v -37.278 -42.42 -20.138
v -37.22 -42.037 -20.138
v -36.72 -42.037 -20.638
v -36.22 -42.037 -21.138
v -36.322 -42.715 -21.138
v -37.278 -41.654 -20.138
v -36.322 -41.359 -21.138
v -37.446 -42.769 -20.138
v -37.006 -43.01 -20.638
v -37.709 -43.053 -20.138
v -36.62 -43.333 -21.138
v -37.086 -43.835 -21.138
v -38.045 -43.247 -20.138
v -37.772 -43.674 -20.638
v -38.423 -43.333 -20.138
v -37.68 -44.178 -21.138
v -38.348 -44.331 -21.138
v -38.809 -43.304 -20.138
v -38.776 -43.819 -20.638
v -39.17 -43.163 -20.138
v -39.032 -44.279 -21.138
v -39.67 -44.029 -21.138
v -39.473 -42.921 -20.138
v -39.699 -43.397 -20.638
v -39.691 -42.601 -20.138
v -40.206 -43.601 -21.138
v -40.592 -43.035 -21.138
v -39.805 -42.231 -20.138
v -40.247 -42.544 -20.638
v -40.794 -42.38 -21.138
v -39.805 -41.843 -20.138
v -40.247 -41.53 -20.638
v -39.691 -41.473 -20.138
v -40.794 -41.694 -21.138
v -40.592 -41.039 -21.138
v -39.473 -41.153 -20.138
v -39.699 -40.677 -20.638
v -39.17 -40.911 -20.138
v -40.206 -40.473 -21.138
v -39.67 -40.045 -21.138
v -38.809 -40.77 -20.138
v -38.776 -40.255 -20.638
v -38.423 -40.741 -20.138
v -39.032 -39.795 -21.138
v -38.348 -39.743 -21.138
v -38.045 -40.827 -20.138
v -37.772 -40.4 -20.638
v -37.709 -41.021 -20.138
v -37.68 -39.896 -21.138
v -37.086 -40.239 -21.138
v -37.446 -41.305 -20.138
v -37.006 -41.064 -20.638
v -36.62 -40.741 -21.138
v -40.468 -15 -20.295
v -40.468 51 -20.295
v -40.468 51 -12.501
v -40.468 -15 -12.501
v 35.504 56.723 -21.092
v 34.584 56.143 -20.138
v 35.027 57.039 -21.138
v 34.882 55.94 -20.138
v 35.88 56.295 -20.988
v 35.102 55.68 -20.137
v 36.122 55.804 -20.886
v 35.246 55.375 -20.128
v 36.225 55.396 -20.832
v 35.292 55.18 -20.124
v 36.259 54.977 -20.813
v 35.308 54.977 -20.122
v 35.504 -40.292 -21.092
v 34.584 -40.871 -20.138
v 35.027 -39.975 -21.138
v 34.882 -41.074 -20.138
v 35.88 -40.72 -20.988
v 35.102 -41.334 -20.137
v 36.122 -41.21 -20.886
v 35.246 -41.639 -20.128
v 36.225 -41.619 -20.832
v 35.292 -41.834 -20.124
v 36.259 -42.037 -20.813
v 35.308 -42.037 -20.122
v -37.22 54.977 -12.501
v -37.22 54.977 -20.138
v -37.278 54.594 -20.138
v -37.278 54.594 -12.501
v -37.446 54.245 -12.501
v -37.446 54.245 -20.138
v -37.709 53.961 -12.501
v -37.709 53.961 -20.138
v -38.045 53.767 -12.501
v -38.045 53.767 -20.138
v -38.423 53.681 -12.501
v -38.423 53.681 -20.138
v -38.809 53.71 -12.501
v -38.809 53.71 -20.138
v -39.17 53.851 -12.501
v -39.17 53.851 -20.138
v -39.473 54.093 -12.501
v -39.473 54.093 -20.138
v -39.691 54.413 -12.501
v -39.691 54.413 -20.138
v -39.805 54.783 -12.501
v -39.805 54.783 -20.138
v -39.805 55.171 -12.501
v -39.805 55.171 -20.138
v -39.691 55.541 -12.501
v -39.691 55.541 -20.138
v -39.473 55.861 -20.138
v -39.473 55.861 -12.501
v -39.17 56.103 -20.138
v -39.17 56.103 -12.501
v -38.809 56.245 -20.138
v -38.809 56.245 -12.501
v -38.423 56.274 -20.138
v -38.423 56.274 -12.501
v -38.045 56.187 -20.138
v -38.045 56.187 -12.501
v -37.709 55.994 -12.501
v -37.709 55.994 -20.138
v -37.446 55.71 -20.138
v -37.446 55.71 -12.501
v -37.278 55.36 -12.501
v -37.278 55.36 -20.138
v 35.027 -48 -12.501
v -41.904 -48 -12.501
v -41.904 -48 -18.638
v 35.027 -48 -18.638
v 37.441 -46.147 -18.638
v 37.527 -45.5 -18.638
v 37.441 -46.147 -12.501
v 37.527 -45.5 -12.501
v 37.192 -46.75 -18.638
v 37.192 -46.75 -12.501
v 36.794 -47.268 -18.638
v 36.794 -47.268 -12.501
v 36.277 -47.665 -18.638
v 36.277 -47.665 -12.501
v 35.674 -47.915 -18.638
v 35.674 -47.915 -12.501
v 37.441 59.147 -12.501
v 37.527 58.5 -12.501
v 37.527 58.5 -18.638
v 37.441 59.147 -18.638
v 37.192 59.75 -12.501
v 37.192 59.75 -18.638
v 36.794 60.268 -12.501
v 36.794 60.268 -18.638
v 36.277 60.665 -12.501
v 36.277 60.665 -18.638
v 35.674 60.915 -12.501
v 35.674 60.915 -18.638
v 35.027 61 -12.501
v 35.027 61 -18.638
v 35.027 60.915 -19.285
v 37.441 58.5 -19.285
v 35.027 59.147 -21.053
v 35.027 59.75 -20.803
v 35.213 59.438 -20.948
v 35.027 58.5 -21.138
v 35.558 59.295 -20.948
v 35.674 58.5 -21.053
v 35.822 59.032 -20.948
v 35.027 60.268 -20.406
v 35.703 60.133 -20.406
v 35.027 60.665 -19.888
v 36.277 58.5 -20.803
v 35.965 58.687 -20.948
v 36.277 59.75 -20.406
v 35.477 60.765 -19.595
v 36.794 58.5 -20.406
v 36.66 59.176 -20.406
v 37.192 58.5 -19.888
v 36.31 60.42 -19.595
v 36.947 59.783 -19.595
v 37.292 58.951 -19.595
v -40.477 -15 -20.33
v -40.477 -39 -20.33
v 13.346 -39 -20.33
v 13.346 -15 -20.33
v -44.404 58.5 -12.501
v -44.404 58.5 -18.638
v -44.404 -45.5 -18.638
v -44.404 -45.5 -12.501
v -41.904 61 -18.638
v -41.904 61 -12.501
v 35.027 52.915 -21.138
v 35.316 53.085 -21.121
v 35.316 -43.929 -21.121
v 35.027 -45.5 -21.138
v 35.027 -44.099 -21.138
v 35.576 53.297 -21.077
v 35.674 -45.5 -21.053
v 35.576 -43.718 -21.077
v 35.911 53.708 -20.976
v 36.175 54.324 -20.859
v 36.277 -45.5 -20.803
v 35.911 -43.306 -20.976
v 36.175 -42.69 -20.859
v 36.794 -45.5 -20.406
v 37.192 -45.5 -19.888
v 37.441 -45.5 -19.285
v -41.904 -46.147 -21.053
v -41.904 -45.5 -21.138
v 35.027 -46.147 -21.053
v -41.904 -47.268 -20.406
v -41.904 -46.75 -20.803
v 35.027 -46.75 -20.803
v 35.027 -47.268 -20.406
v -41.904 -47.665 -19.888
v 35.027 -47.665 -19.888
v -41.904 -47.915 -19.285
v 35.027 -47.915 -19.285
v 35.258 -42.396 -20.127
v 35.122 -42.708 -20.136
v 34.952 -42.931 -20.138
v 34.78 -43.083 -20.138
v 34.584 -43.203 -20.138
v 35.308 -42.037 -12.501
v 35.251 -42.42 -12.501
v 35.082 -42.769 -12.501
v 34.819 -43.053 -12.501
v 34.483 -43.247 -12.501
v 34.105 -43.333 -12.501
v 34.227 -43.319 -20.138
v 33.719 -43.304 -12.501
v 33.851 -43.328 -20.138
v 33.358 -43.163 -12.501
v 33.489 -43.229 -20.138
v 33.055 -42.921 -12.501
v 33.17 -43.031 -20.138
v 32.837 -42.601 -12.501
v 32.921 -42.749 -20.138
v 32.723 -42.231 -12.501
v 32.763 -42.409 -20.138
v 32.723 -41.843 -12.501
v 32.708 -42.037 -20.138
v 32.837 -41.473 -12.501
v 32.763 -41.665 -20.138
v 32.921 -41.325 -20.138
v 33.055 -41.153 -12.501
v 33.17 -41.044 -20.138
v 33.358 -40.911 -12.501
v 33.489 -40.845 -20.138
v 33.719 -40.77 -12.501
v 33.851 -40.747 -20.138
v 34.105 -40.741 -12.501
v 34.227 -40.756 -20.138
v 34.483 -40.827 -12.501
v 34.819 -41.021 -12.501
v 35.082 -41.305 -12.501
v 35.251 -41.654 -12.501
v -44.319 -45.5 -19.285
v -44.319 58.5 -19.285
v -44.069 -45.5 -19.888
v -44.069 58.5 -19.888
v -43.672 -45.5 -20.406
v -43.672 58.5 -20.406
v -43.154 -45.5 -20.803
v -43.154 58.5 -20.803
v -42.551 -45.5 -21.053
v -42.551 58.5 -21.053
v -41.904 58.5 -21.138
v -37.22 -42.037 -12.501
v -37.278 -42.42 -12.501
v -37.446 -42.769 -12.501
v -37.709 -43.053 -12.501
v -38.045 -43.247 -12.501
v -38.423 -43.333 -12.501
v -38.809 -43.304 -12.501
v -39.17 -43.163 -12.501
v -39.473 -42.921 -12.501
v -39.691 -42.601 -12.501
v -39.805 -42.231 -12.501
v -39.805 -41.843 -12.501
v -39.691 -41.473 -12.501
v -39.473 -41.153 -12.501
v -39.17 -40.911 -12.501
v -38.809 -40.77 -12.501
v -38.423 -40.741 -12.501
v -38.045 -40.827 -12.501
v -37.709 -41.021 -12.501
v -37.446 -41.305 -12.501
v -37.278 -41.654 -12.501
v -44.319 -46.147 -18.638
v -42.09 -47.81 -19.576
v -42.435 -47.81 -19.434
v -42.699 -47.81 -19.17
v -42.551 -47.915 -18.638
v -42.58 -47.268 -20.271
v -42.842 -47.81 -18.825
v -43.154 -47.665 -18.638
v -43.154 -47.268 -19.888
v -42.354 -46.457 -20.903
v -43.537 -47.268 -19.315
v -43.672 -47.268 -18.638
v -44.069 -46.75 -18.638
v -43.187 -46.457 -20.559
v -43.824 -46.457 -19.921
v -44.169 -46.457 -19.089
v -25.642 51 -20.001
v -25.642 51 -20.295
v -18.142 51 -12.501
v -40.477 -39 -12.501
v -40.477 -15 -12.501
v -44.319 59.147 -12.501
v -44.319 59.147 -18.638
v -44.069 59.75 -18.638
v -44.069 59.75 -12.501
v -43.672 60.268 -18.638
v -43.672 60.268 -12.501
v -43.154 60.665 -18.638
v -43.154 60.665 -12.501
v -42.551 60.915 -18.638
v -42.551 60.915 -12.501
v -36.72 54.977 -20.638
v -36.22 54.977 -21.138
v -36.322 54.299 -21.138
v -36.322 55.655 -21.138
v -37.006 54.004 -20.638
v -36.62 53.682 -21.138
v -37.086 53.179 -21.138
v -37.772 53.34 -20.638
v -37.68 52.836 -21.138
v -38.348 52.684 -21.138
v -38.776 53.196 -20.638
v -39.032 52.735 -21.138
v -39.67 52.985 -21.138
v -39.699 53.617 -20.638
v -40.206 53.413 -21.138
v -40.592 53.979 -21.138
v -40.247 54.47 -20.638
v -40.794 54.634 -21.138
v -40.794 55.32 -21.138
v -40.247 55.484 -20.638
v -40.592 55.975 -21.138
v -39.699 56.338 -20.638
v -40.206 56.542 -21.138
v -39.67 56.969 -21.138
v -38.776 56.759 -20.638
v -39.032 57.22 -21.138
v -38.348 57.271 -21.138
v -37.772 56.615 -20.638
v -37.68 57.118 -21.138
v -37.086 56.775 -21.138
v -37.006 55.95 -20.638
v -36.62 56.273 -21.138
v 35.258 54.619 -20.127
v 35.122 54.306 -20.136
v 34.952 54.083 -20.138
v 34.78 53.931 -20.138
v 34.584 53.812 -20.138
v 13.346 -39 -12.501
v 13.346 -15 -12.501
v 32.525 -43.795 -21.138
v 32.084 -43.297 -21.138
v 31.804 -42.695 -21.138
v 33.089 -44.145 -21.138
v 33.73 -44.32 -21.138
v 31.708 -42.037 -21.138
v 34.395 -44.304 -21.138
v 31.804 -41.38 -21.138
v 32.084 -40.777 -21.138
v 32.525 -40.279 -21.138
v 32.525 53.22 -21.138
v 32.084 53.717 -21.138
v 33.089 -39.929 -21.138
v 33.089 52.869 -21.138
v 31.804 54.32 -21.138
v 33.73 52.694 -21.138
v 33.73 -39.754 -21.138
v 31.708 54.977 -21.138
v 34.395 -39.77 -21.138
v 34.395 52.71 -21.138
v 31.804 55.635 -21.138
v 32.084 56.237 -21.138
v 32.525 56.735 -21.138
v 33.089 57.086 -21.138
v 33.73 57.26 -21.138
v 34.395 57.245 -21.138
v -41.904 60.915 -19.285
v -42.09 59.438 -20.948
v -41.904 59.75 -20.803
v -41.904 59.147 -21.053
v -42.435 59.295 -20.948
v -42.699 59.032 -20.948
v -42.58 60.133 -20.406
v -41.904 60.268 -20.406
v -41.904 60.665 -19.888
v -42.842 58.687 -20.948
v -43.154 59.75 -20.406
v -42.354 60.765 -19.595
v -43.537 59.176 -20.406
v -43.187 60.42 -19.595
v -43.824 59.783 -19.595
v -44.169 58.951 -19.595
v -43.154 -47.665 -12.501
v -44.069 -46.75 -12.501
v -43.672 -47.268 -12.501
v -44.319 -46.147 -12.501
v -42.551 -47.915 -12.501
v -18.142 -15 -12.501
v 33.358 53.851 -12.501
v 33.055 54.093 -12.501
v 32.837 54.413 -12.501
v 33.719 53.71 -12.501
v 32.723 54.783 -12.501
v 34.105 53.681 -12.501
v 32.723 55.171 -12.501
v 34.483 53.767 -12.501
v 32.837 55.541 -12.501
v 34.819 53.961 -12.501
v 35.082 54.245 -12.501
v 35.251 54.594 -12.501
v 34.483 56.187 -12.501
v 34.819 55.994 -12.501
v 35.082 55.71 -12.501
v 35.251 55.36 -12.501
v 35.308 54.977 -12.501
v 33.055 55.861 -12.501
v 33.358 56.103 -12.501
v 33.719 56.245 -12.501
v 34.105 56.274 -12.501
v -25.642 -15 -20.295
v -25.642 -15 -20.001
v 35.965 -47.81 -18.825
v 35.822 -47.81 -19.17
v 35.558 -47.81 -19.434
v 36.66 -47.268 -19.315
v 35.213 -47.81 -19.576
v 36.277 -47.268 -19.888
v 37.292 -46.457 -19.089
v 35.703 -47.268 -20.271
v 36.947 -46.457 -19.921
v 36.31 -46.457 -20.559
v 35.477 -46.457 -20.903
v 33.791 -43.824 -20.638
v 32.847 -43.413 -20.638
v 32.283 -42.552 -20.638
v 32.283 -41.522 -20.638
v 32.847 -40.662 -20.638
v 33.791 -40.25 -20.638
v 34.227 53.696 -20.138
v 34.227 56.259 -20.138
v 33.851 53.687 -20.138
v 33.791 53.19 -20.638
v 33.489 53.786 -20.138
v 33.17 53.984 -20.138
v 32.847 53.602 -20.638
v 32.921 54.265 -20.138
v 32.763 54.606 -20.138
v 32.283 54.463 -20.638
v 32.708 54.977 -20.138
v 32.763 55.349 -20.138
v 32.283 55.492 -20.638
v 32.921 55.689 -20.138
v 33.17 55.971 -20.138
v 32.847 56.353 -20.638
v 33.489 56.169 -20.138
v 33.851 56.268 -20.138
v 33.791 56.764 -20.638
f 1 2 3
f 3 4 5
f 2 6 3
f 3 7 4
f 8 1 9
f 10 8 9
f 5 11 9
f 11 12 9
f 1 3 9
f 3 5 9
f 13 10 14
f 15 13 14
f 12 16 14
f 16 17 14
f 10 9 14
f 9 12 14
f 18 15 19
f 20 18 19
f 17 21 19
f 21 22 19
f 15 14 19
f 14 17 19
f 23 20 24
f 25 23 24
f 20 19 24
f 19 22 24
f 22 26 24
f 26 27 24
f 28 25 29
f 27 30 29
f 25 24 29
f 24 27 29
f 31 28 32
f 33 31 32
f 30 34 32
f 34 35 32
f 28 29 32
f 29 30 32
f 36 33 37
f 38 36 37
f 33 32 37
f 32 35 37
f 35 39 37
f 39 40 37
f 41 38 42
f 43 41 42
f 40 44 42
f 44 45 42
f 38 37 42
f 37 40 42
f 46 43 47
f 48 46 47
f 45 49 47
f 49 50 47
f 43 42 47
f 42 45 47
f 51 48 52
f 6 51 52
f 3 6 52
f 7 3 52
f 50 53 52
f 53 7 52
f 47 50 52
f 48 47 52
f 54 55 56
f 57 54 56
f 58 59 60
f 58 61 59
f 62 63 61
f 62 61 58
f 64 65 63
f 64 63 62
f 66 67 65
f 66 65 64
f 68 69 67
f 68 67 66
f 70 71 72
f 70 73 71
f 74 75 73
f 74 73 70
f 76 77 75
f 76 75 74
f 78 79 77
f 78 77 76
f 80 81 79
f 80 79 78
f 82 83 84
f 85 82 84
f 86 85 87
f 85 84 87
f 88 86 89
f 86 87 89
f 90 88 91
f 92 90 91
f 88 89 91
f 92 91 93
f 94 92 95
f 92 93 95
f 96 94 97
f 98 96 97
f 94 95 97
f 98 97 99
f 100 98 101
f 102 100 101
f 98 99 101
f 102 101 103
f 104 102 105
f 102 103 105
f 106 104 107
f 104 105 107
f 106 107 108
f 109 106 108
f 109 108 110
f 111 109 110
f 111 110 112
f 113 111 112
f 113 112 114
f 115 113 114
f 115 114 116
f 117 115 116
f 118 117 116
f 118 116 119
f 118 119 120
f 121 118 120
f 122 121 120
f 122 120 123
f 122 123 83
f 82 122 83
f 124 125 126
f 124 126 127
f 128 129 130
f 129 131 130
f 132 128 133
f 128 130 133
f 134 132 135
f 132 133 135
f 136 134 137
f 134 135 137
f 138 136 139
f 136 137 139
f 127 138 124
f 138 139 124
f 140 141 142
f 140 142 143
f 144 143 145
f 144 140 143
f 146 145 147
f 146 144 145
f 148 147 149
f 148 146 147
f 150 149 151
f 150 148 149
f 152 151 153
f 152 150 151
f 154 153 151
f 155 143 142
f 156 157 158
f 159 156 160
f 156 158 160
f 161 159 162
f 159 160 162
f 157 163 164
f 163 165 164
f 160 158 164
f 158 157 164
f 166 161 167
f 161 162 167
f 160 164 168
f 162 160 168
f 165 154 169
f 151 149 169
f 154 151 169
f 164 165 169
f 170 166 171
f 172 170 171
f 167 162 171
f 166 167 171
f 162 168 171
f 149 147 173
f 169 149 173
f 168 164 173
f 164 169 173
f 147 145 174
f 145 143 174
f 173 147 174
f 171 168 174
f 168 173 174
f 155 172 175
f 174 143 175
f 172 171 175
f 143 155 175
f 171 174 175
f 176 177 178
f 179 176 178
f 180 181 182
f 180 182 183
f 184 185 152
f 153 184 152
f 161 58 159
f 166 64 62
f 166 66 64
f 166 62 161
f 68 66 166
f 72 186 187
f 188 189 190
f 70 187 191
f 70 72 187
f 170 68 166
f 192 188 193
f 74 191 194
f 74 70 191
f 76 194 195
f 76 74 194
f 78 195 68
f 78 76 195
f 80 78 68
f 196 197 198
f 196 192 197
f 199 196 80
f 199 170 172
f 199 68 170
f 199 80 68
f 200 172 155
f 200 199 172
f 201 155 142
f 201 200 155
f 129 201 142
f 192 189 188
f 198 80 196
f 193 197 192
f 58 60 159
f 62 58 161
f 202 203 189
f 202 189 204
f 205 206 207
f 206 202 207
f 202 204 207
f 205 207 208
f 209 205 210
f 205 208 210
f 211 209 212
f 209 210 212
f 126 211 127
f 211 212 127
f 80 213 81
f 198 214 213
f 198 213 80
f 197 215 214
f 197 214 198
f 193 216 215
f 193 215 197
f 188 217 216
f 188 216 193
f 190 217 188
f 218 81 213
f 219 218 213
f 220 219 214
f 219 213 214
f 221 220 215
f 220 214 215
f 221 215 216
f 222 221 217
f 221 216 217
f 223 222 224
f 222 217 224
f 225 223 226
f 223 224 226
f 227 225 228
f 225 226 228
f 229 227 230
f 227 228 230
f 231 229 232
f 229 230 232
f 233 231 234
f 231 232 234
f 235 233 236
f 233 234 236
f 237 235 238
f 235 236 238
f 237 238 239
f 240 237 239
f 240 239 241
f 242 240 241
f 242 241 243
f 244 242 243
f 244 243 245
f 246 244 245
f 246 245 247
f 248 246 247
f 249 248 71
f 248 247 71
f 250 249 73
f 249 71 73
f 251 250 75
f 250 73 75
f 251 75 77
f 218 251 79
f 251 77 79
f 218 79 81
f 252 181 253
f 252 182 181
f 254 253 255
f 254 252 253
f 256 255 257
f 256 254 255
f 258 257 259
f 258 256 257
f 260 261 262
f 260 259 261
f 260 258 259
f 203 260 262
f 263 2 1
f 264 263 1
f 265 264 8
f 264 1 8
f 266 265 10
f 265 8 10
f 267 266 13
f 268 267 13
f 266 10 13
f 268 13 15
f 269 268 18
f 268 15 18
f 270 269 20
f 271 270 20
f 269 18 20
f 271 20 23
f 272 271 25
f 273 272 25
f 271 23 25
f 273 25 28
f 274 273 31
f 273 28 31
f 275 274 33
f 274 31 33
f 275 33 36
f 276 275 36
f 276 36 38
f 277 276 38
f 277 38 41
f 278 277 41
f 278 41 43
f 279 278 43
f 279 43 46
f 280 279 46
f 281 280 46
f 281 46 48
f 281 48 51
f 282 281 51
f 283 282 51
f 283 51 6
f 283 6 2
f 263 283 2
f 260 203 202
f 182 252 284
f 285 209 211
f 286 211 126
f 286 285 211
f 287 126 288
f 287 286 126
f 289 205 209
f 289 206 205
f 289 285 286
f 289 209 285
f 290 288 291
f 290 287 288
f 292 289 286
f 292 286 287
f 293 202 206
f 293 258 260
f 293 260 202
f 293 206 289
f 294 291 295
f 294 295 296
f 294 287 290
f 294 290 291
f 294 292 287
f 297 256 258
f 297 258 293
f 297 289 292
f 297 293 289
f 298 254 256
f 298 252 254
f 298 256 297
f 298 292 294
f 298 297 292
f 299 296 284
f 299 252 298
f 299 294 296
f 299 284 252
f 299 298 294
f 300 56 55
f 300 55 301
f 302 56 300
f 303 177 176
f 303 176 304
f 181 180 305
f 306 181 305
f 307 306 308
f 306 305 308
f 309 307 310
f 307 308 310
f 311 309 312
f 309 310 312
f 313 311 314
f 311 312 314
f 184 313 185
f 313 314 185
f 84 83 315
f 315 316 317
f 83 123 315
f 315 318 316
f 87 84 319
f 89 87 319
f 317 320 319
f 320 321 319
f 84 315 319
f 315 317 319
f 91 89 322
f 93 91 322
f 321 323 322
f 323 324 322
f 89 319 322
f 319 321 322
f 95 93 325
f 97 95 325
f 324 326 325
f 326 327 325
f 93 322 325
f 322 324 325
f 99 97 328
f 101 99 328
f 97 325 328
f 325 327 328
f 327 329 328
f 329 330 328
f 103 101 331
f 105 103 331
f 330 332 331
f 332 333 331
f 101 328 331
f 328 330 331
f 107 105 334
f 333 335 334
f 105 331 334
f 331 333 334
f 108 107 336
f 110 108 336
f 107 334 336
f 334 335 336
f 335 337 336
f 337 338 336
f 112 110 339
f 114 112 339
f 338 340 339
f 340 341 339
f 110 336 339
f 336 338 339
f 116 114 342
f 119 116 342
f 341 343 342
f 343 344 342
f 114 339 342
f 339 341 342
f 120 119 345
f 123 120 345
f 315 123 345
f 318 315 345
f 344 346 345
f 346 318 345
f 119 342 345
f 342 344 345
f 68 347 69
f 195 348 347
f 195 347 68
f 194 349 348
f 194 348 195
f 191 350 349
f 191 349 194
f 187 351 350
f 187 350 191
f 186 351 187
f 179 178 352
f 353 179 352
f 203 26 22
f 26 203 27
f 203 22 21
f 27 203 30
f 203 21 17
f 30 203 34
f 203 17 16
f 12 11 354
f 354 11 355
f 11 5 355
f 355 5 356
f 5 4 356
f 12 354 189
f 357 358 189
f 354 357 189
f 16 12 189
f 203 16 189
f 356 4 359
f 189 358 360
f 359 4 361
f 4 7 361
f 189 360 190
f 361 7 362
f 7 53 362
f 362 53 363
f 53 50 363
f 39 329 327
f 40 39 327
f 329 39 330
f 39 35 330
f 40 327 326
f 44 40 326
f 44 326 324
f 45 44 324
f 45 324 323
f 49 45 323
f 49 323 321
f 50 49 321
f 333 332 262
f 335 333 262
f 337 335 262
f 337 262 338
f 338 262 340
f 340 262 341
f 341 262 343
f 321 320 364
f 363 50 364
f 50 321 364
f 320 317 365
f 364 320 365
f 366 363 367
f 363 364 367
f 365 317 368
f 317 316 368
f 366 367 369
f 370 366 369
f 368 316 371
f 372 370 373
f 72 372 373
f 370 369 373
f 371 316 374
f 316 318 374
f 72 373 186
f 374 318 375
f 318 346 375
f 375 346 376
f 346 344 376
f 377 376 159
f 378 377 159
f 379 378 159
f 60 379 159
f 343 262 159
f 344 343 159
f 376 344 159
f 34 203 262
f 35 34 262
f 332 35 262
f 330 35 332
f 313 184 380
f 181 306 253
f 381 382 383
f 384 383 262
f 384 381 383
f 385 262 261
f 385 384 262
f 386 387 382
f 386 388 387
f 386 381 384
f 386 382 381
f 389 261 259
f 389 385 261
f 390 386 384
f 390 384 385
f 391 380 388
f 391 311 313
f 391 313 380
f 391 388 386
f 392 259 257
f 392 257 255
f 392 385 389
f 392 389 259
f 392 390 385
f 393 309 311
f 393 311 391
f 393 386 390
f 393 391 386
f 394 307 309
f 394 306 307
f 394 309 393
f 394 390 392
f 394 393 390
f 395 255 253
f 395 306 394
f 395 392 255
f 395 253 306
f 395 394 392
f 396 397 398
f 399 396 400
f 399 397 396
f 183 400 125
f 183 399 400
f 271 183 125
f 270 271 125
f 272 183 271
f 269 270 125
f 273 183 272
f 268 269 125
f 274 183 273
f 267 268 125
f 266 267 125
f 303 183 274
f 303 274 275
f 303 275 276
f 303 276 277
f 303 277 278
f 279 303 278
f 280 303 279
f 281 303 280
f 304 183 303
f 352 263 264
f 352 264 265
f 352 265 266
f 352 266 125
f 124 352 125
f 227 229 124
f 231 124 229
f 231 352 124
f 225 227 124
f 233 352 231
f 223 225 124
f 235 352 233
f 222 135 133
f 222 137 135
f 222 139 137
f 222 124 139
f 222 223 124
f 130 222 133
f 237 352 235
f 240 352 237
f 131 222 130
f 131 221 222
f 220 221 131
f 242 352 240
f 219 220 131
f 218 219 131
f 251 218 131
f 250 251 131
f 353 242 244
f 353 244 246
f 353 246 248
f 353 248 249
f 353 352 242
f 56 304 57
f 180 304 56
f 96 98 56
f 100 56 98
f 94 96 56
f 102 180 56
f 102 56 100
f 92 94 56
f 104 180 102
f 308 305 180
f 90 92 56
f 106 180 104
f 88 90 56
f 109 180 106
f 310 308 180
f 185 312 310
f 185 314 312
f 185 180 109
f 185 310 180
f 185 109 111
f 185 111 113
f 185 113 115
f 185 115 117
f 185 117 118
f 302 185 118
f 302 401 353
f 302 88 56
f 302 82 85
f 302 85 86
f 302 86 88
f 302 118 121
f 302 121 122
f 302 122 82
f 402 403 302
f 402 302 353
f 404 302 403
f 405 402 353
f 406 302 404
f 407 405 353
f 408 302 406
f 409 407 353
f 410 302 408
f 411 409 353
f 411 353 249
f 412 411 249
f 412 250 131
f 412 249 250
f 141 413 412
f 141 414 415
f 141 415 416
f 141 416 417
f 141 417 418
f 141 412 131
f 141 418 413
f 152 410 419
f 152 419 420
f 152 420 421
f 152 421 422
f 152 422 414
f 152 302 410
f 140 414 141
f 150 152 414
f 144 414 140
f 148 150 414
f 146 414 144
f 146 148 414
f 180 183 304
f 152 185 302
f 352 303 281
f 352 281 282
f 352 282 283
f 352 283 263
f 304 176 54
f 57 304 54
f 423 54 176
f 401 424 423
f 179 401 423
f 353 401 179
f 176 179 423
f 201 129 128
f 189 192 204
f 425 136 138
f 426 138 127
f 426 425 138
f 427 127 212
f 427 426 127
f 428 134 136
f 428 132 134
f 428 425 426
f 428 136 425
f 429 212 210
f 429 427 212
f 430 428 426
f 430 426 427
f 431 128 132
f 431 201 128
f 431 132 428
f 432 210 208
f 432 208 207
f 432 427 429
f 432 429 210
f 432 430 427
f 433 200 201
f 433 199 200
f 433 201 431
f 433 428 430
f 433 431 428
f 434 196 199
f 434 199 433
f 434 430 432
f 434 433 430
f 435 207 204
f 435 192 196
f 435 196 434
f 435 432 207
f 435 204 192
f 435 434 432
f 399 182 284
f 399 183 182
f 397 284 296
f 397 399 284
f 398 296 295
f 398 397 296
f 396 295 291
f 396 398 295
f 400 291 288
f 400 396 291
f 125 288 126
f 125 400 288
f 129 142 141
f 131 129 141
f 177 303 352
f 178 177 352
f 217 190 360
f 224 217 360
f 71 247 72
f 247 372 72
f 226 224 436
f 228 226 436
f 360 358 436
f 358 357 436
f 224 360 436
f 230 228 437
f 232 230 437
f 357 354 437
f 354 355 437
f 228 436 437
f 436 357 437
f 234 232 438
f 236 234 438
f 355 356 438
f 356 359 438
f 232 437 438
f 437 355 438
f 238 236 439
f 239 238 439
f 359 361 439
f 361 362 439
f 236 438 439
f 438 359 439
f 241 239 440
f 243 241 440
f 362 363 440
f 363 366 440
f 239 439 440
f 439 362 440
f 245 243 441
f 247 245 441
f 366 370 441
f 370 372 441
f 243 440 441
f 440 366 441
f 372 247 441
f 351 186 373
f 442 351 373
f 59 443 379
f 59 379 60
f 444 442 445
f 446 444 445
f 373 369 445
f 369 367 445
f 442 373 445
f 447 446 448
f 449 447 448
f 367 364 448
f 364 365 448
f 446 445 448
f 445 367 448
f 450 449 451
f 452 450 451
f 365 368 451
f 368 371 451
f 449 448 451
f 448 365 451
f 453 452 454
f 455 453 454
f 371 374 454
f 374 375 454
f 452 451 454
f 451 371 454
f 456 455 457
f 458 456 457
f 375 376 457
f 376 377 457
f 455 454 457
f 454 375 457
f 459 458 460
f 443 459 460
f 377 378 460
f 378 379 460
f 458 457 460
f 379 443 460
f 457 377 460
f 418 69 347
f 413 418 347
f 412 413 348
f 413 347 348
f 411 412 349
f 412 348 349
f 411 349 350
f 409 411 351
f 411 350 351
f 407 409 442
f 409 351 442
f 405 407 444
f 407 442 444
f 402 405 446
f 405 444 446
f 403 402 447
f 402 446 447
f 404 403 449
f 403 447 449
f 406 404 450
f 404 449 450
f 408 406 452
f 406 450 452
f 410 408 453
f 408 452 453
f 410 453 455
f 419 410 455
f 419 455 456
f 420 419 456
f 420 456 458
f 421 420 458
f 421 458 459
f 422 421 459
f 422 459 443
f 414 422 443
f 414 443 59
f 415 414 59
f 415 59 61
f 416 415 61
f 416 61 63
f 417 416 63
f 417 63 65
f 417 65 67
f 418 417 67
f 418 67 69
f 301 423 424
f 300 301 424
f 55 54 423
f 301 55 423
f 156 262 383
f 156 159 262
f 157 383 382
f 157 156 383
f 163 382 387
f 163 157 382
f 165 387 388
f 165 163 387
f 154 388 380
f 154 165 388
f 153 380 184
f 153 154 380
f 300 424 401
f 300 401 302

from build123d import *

# Parameters (mm, degrees)
SKETCH060_W     = 81.930373
SKETCH060_H     = 8.636624
PAD014_DEPTH    = 109
FILLET032_R     = 2.5
SKETCH061_W     = 53.822303
SKETCH061_H     = 19.035354
POCKET028_DEPTH = 24
SKETCH062_W     = 14.825619
SKETCH062_H     = 9.085716
POCKET029_DEPTH = 66
CHAMFER015_SIZE = 7.5
SKETCH063_R     = 1.3
POCKET030_DEPTH = 8.637624
CHAMFER016_SIZE = 1


with BuildPart() as part:
    # Sketch060 → Pad014 (new body)
    with BuildSketch(Plane.XZ.offset(-61)):
        with Locations((-3.438551, -16.819782)):
            Rectangle(SKETCH060_W, SKETCH060_H)
    extrude(amount=PAD014_DEPTH)

    # Fillet032
    fillet032_edges = [part.edges().sort_by_distance(p)[0] for p in [
        (-44.403737, 61, -16.819782),
        (37.526636, 61, -16.819782),
        (-3.43855, 61, -21.138094),
        (-44.403737, 6.5, -21.138094),
        (37.526636, 6.5, -21.138094),
        (37.526636, -48, -16.819782),
        (-3.43855, -48, -21.138094),
        (-44.403737, -48, -16.819782),
    ]]
    fillet(fillet032_edges, radius=FILLET032_R)

    # Sketch061 → Pocket028 (cut)
    with BuildSketch(Plane.XZ.offset(39)):
        with Locations((-13.565516, -10.812245)):
            Rectangle(SKETCH061_W, SKETCH061_H)
    extrude(amount=-POCKET028_DEPTH, mode=Mode.SUBTRACT)

    # Sketch062 → Pocket029 (cut)
    with BuildSketch(Plane.XZ.offset(15)):
        with Locations((-33.055162, -15.752031)):
            Rectangle(SKETCH062_W, SKETCH062_H)
    extrude(amount=-POCKET029_DEPTH, mode=Mode.SUBTRACT)

    # Chamfer015
    chamfer015_edges = [part.edges().sort_by_distance(p)[0] for p in [
        (-25.642353, 18, -12.50147),
    ]]
    chamfer(chamfer015_edges, length=CHAMFER015_SIZE)

    # Sketch063 (on Face28 of Chamfer015) → Pocket030 (cut, through all)
    with BuildSketch(Plane(origin=(0, 0, -21.138094), x_dir=(1, 0, 0), z_dir=(0, 0, -1))):
        with Locations((-38.519981, 42.037067)):
            Circle(SKETCH063_R)
        with Locations((34.008266, 42.037067)):
            Circle(SKETCH063_R)
        with Locations((34.008266, -54.977215)):
            Circle(SKETCH063_R)
        with Locations((-38.519981, -54.977215)):
            Circle(SKETCH063_R)
    extrude(amount=-POCKET030_DEPTH, mode=Mode.SUBTRACT)

    # Chamfer016
    chamfer016_edges = [part.edges().sort_by_distance(p)[0] for p in [
        (32.708266, -42.037067, -21.138094),
        (32.708266, 54.977215, -21.138094),
        (-39.819981, 54.977215, -21.138094),
        (-39.819981, -42.037067, -21.138094),
    ]]
    chamfer(chamfer016_edges, length=CHAMFER016_SIZE)


solid = part.part
